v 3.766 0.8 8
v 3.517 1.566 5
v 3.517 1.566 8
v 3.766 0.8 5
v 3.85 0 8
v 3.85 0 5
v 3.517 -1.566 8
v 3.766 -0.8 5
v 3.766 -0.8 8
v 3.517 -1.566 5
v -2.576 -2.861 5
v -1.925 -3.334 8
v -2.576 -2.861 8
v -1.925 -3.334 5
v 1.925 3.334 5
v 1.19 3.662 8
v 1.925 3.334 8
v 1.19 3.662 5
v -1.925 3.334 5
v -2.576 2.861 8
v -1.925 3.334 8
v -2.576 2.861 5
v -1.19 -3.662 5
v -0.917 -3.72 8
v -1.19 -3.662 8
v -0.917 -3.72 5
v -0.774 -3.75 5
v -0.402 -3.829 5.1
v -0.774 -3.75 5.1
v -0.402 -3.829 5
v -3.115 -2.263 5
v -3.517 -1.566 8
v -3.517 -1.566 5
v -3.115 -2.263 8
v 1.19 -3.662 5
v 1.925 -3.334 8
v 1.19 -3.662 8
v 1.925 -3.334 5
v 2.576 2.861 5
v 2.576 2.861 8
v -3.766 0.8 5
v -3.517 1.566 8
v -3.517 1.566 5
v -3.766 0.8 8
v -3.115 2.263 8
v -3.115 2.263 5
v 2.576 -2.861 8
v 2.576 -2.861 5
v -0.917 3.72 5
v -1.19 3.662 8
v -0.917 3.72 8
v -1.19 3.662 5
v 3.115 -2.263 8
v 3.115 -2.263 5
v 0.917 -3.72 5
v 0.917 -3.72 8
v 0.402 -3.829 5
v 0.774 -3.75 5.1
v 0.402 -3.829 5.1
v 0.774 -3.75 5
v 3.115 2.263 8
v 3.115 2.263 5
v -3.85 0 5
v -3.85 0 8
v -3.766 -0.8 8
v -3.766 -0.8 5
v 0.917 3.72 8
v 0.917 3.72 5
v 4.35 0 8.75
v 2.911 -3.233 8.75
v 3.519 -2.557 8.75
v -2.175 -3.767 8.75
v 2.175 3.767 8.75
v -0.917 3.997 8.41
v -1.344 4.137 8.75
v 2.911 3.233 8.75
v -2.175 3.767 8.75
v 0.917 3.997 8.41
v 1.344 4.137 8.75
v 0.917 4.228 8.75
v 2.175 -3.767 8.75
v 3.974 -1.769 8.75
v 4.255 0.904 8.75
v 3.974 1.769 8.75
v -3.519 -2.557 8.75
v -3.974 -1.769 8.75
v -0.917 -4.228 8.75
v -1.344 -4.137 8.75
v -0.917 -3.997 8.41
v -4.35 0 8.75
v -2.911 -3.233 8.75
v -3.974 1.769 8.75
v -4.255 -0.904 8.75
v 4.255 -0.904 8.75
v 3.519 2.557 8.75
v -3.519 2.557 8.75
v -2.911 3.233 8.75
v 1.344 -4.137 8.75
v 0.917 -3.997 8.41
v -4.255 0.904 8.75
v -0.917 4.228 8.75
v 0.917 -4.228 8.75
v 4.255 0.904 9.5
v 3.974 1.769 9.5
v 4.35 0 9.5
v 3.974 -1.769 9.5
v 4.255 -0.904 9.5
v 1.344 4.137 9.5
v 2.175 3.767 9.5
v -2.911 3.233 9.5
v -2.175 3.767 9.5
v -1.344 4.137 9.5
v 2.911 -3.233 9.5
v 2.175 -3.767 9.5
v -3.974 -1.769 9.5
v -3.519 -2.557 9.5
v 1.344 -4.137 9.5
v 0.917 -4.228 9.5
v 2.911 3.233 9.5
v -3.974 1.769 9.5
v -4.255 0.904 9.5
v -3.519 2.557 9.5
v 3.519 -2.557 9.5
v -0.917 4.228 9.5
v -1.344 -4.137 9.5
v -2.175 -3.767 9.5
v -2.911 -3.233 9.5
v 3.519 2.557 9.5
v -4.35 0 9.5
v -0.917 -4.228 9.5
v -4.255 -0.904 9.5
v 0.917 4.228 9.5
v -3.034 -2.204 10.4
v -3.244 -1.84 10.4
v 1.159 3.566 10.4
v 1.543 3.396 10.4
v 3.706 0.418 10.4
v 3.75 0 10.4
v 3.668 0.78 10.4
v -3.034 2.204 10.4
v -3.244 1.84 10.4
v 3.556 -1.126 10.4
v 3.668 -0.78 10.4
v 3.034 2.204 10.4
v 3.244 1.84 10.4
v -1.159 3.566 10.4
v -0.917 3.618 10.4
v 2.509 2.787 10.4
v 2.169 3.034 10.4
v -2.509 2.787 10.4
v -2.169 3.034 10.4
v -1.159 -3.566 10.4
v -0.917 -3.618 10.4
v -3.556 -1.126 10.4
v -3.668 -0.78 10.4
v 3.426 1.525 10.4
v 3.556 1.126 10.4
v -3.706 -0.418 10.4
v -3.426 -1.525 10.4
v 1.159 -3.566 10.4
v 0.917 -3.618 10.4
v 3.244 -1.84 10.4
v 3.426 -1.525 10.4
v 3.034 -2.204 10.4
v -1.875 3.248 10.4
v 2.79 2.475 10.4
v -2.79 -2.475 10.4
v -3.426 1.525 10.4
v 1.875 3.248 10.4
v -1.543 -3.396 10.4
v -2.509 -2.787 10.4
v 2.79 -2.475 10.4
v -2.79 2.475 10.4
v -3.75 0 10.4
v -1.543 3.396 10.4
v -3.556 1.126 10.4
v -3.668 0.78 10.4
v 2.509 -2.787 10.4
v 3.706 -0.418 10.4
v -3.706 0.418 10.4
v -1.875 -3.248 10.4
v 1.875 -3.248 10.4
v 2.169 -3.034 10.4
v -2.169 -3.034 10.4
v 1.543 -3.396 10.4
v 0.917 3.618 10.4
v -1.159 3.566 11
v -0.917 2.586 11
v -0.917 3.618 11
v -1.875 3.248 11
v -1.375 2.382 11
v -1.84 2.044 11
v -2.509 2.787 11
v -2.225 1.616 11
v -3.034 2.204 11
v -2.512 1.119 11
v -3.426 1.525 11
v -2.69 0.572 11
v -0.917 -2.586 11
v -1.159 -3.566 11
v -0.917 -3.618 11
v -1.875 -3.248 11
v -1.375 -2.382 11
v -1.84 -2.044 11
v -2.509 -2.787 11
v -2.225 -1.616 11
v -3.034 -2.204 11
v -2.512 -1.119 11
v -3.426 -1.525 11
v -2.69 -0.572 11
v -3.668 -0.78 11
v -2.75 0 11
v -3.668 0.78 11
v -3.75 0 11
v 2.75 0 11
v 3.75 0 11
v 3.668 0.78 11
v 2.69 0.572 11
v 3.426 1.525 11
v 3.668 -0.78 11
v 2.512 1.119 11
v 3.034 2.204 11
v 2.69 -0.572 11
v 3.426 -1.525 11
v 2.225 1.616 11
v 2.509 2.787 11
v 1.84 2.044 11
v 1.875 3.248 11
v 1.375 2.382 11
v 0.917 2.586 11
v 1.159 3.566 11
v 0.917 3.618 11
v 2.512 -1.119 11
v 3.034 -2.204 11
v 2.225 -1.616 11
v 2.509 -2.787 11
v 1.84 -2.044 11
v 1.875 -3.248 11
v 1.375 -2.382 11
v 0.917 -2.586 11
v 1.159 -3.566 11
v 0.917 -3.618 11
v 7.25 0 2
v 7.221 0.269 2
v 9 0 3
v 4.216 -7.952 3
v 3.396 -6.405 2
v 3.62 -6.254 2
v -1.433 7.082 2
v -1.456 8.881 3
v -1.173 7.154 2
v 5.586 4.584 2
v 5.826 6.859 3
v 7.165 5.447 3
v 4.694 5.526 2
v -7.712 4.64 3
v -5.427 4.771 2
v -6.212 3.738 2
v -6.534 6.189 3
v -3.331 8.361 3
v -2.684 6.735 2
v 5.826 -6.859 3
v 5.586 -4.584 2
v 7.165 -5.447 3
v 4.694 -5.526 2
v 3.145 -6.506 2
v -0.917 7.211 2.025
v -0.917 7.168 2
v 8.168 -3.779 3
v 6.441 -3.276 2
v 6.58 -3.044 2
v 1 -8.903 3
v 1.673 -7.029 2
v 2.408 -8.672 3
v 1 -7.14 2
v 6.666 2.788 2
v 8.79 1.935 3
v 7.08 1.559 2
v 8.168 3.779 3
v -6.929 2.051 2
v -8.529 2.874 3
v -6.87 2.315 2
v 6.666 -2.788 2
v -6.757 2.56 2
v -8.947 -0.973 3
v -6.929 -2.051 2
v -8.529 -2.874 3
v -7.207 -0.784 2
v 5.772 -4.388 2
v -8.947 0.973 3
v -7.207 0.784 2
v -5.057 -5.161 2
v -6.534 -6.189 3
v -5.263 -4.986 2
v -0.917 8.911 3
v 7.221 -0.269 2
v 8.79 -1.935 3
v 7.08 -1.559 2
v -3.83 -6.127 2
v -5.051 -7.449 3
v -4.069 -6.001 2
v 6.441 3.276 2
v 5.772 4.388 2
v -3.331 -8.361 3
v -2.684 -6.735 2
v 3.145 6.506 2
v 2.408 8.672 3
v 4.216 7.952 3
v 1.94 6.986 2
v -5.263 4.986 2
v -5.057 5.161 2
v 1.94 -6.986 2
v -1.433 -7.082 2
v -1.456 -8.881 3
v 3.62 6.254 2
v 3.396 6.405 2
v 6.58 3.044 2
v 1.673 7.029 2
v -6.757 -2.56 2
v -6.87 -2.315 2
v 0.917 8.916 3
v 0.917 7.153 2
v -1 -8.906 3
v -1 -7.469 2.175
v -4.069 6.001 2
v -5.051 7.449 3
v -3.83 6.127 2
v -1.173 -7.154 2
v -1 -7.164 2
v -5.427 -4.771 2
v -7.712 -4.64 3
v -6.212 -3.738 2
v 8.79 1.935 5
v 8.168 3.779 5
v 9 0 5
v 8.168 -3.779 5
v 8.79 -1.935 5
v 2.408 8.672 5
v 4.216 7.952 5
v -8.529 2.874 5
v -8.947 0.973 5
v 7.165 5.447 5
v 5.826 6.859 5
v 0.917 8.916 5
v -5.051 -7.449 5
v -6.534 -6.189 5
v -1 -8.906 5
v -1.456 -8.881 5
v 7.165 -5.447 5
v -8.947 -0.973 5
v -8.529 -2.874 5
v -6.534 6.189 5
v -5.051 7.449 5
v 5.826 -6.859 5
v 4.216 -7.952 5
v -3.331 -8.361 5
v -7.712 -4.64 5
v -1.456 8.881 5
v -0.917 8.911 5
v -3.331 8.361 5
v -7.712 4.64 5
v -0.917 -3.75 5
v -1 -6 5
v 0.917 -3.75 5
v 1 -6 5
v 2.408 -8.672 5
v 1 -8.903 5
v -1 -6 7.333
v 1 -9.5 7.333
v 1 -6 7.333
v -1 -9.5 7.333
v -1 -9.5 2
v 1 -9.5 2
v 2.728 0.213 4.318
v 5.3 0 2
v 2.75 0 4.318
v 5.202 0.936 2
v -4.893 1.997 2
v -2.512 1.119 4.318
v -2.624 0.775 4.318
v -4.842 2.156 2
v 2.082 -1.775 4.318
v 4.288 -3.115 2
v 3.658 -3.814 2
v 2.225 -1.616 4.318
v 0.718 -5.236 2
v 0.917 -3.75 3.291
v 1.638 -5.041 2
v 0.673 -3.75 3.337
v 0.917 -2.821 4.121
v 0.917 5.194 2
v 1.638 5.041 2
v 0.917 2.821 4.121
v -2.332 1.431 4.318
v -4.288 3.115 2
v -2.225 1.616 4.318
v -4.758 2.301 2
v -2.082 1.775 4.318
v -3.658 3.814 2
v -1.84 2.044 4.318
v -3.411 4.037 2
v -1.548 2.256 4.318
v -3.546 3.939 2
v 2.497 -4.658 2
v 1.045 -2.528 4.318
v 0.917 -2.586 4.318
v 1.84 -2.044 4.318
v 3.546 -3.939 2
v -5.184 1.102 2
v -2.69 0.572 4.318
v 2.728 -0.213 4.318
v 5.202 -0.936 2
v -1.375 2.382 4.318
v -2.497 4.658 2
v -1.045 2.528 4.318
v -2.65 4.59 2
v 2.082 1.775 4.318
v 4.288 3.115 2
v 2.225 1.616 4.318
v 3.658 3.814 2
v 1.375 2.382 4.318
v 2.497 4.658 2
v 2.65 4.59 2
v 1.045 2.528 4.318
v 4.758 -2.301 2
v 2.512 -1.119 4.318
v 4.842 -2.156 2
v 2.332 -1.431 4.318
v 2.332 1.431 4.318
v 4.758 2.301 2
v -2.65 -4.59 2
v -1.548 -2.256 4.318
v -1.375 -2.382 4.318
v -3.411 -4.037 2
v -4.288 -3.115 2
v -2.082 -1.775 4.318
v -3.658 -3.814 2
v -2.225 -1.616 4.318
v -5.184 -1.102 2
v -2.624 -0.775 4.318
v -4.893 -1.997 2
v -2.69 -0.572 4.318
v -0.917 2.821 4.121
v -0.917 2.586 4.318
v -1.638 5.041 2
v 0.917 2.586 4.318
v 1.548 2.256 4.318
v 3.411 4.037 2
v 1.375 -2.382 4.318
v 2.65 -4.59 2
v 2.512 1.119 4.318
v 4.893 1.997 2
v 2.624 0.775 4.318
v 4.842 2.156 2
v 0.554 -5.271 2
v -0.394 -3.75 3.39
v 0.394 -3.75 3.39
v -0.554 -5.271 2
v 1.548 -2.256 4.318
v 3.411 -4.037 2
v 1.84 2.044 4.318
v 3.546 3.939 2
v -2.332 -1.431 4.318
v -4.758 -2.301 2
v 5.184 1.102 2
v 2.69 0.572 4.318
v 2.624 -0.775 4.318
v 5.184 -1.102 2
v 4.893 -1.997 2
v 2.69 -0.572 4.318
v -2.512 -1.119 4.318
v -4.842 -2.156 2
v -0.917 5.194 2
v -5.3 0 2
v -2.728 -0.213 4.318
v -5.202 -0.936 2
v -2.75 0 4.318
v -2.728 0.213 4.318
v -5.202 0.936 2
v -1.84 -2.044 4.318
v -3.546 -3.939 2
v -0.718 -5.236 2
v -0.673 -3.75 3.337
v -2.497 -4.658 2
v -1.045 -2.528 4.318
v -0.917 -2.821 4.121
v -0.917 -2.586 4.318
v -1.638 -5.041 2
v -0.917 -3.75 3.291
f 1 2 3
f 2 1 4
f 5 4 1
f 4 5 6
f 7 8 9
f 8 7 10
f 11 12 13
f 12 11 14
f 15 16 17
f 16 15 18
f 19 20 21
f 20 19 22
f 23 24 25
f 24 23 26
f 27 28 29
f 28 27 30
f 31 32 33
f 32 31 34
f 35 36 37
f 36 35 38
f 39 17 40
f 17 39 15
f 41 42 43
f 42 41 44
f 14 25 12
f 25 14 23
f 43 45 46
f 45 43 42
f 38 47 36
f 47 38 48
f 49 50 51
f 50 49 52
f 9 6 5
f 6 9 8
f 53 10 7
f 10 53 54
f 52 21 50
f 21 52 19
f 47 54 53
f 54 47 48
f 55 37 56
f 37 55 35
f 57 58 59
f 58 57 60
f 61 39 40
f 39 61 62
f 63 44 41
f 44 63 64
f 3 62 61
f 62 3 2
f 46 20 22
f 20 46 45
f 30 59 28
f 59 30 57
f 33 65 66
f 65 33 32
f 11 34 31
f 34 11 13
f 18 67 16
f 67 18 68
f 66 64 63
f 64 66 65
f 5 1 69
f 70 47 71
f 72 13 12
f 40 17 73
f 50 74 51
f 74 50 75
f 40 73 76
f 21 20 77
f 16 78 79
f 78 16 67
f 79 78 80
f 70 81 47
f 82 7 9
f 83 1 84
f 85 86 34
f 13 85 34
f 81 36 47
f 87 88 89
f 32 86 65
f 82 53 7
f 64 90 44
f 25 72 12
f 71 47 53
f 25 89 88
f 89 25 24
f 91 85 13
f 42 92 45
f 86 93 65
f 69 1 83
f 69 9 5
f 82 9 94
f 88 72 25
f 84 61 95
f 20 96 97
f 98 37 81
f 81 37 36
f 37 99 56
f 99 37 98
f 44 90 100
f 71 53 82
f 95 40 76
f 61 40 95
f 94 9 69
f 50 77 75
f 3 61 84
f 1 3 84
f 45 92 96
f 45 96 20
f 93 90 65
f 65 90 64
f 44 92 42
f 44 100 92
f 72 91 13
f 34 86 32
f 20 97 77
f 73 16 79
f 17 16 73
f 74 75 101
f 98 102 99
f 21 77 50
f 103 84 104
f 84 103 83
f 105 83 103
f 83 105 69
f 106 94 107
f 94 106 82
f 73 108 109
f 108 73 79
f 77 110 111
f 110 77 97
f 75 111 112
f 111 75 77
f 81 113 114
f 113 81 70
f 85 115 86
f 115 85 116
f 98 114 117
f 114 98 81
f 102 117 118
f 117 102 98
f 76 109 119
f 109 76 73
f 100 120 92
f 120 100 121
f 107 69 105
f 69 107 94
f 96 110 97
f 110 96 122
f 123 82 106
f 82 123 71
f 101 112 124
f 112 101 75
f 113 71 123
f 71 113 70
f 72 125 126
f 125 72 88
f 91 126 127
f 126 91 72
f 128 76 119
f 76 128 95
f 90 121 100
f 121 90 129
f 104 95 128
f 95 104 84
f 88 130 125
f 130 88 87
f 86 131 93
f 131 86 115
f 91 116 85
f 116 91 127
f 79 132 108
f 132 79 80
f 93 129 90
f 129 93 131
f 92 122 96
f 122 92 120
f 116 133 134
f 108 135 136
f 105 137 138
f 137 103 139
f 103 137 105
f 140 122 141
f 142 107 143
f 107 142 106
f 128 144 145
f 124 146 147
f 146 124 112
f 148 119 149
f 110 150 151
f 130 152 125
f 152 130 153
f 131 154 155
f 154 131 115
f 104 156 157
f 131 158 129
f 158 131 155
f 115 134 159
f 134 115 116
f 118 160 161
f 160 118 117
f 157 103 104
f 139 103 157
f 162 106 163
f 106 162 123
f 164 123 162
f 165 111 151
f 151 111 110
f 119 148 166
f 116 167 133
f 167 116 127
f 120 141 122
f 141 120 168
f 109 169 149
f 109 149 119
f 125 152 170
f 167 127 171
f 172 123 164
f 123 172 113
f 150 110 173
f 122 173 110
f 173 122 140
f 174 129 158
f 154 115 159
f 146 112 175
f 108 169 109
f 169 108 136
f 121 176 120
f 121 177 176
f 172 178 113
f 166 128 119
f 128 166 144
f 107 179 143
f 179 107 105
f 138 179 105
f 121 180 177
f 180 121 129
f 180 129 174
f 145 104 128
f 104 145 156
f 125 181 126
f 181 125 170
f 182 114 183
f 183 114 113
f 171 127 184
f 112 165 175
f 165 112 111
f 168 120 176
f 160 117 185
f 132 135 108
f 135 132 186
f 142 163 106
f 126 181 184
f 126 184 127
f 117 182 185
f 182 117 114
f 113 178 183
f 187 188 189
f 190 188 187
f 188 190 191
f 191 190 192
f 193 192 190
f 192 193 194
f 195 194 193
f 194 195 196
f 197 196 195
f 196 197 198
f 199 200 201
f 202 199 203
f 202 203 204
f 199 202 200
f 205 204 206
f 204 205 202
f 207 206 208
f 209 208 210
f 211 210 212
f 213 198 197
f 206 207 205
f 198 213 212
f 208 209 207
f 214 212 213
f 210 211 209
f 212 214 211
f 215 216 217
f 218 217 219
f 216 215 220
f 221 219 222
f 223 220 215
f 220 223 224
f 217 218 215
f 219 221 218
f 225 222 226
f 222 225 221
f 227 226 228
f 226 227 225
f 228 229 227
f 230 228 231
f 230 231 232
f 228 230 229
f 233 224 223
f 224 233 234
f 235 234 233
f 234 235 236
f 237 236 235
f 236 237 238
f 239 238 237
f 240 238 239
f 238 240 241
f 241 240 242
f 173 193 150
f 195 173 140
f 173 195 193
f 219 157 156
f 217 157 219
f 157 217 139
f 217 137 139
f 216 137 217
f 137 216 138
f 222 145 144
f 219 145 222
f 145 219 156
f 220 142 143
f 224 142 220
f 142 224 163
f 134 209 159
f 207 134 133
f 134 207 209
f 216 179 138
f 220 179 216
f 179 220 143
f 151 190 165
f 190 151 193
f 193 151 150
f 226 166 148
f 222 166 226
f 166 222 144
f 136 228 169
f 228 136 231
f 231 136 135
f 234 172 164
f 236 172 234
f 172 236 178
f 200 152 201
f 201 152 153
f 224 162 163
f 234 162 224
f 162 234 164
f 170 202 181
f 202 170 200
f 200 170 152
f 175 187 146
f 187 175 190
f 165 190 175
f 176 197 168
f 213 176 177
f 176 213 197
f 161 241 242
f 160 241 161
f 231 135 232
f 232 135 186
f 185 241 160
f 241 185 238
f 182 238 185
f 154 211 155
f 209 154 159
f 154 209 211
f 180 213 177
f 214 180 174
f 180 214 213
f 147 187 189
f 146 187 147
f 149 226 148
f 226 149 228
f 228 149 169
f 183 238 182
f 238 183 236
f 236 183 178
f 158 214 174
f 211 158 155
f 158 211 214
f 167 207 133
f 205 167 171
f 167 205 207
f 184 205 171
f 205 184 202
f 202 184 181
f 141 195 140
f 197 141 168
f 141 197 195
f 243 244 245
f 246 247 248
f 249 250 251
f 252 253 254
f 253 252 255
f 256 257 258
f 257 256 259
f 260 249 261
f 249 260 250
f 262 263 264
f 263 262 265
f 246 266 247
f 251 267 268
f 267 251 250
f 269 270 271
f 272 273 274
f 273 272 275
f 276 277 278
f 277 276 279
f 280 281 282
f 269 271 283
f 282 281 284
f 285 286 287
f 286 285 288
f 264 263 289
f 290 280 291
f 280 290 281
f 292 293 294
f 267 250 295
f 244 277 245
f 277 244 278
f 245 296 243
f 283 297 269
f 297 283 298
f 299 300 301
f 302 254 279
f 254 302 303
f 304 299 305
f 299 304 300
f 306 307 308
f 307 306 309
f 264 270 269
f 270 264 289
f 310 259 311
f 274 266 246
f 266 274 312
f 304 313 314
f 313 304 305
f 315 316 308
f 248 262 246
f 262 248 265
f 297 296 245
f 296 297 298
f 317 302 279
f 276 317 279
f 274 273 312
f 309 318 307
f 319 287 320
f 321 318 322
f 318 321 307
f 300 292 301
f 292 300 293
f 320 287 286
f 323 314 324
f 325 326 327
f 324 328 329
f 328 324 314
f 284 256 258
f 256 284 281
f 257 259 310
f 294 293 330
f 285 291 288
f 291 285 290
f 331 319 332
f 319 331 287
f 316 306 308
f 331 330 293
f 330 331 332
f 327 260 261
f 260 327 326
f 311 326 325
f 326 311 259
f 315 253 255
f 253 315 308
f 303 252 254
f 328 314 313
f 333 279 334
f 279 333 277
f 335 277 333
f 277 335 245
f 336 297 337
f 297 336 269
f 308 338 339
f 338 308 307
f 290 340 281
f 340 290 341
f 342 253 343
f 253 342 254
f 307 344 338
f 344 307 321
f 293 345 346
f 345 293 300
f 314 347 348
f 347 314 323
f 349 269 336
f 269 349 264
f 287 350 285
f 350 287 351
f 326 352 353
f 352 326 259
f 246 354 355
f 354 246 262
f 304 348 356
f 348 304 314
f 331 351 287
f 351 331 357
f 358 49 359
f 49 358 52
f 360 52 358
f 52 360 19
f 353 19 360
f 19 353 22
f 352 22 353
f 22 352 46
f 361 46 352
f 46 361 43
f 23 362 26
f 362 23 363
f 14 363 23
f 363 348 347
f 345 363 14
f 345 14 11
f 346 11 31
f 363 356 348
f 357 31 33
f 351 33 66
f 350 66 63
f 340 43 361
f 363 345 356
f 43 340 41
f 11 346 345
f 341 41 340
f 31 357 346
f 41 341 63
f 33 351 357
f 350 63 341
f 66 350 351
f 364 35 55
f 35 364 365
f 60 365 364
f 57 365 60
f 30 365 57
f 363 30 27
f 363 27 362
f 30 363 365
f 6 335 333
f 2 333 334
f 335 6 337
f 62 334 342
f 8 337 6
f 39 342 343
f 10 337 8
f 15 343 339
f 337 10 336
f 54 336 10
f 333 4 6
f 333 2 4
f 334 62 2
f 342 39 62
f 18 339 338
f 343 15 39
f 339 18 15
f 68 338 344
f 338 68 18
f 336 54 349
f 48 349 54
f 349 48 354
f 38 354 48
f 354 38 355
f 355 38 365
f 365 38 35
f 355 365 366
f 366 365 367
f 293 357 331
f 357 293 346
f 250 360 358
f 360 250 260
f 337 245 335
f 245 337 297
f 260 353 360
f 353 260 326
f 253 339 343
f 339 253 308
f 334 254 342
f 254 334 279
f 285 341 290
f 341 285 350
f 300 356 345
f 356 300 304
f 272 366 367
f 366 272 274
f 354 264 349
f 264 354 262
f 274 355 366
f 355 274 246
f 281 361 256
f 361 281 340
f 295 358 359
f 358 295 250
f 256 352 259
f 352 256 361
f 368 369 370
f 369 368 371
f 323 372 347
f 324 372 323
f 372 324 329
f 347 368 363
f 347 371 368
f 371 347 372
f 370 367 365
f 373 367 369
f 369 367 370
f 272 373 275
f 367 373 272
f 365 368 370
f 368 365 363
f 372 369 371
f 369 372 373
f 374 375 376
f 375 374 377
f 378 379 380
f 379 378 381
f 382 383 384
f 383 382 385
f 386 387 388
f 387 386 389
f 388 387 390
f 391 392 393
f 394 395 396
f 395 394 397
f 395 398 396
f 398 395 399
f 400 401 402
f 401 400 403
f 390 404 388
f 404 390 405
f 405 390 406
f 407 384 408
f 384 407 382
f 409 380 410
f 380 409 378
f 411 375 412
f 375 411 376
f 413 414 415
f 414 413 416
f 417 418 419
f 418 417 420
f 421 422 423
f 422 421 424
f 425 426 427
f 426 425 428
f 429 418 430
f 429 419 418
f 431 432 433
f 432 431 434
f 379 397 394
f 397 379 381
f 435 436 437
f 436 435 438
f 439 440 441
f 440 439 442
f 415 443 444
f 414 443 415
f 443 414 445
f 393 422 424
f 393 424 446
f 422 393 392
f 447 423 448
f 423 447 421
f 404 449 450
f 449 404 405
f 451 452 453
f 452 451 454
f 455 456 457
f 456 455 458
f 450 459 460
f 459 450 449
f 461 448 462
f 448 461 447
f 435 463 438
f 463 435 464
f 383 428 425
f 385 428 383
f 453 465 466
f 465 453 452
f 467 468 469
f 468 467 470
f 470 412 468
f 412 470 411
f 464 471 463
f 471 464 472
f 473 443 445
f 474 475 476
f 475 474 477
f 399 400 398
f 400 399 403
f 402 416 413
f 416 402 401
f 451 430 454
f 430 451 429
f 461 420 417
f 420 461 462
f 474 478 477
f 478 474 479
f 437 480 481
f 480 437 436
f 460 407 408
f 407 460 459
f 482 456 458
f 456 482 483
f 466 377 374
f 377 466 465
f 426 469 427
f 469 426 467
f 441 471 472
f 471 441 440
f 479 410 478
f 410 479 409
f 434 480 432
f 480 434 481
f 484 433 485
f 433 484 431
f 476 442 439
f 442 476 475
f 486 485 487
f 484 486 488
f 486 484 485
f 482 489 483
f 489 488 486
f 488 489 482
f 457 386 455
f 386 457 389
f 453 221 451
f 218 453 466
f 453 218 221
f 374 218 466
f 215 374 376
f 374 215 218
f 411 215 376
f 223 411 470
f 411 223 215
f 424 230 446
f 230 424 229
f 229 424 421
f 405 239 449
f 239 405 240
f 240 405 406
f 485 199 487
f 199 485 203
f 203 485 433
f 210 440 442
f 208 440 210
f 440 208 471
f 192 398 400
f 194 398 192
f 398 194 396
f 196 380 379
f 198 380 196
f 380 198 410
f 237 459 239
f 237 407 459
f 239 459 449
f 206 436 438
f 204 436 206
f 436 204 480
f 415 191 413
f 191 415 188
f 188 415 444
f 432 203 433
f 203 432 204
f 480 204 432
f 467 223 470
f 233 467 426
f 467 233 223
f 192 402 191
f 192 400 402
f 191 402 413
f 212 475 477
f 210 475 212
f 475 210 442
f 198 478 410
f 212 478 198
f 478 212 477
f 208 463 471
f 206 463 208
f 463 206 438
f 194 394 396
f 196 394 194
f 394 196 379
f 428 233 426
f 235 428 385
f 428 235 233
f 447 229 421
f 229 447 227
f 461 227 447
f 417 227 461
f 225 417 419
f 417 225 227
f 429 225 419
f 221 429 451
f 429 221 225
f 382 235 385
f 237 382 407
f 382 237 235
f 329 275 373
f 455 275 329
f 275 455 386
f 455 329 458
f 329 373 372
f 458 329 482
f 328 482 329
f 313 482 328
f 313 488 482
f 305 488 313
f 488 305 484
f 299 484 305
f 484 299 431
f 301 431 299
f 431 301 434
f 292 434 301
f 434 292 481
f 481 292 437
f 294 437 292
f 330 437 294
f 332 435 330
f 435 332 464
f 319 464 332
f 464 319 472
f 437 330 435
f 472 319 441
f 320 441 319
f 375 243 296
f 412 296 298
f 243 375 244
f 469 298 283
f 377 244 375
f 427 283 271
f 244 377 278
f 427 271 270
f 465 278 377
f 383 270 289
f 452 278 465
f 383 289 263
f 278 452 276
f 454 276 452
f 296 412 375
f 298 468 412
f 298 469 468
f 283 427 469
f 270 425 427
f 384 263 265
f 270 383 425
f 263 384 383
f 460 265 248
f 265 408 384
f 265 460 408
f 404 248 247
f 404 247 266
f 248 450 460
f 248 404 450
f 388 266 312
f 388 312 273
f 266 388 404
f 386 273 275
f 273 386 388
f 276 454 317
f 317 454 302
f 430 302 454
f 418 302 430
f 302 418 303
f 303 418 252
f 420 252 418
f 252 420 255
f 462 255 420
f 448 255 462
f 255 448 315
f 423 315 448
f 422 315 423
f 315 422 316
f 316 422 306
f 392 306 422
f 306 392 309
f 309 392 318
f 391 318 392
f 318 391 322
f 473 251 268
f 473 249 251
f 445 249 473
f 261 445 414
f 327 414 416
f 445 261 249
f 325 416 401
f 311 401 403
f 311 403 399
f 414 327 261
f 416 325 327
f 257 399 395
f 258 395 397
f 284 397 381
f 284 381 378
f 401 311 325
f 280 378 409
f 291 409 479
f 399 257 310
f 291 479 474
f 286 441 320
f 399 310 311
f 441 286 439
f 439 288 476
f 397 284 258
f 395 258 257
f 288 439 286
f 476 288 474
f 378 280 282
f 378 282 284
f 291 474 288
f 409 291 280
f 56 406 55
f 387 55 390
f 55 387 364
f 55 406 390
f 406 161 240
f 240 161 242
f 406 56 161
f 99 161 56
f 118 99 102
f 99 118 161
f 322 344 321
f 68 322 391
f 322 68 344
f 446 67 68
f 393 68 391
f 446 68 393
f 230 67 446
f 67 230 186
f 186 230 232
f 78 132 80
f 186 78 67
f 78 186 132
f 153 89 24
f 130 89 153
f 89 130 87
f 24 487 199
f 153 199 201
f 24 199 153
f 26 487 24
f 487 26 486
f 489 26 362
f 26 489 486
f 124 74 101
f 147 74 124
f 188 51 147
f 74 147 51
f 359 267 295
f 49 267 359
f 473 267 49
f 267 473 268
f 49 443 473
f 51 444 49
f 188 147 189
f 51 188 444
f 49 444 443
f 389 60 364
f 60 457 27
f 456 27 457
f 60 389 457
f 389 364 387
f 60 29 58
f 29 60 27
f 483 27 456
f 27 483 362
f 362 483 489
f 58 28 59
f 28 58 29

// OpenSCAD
inner_diameter = 7.5;
outer_diameter = 18;
height = 11;
gap_fin = 2;

module pin_solid(h=10, r=4, lh=3, lt=1) {
  union() {
    // shaft
    cylinder(h=h-lh, r=r, $fn=30);
    // lip
    // translate([0, 0, h-lh]) cylinder(h=lh*0.25, r1=r, r2=r+(lt/2), $fn=30);
    // translate([0, 0, h-lh+lh*0.25]) cylinder(h=lh*0.25, r2=r, r1=r+(lt/2), $fn=30);
    // translate([0, 0, h-lh+lh*0.50]) cylinder(h=lh*0.50, r1=r, r2=r-(lt/2), $fn=30);

    // translate([0, 0, h-lh]) cylinder(h=lh*0.50, r1=r, r2=r+(lt/2), $fn=30);
    // translate([0, 0, h-lh+lh*0.50]) cylinder(h=lh*0.50, r1=r+(lt/2), r2=r-(lt/3), $fn=30);    

    translate([0, 0, h-lh]) cylinder(h=lh*0.25, r1=r, r2=r+(lt/2), $fn=30);
    translate([0, 0, h-lh+lh*0.25]) cylinder(h=lh*0.25, r=r+(lt/2), $fn=30);    
    translate([0, 0, h-lh+lh*0.50]) cylinder(h=lh*0.50, r1=r+(lt/2), r2=r-(lt/2), $fn=30);    

    // translate([0, 0, h-lh]) cylinder(h=lh, r1=r+(lt/2), r2=1, $fn=30);
    // translate([0, 0, h-lh-lt/2]) cylinder(h=lt/2, r1=r, r2=r+(lt/2), $fn=30);
  }
}

module part_insert() {
    difference() {
        union() {
            cylinder(r=inner_diameter/2, h=height, $fn=30);

            cylinder(r1=inner_diameter/2, r2=outer_diameter/2, h=3);
            translate([0, 0, 3])
            cylinder(r=outer_diameter/2, h=2);
            translate([gap_fin/2, -outer_diameter/3, 0])
                rotate(a=[0, 0, 180])
                    cube([gap_fin, (outer_diameter-inner_diameter)/3, height*2/3]);
            pin_solid(height, (inner_diameter/2) + 0.1, 3, 1);
         }
        cylinder(r1=(inner_diameter), r2=2, h=5, $fn=30);
        cylinder(r=(inner_diameter-2)/2, h=height+1, $fn=30);
         translate([0, 0, -2])
            cylinder(r=outer_diameter*2, h=4);
        translate([-(inner_diameter-2)/6, -inner_diameter/2, 1])
            cube([(inner_diameter-2)/3, (outer_diameter*2/3)+2, (height/2)+5]);
        translate([-(inner_diameter-2)/6, -inner_diameter/2+1-3, 5.1])
            cube([(inner_diameter-2)/3, (outer_diameter*2/3)+2, (height/2)+5]);
    }
}
part_insert();
// pin_solid(h, r+(t/2), lh, lt);
